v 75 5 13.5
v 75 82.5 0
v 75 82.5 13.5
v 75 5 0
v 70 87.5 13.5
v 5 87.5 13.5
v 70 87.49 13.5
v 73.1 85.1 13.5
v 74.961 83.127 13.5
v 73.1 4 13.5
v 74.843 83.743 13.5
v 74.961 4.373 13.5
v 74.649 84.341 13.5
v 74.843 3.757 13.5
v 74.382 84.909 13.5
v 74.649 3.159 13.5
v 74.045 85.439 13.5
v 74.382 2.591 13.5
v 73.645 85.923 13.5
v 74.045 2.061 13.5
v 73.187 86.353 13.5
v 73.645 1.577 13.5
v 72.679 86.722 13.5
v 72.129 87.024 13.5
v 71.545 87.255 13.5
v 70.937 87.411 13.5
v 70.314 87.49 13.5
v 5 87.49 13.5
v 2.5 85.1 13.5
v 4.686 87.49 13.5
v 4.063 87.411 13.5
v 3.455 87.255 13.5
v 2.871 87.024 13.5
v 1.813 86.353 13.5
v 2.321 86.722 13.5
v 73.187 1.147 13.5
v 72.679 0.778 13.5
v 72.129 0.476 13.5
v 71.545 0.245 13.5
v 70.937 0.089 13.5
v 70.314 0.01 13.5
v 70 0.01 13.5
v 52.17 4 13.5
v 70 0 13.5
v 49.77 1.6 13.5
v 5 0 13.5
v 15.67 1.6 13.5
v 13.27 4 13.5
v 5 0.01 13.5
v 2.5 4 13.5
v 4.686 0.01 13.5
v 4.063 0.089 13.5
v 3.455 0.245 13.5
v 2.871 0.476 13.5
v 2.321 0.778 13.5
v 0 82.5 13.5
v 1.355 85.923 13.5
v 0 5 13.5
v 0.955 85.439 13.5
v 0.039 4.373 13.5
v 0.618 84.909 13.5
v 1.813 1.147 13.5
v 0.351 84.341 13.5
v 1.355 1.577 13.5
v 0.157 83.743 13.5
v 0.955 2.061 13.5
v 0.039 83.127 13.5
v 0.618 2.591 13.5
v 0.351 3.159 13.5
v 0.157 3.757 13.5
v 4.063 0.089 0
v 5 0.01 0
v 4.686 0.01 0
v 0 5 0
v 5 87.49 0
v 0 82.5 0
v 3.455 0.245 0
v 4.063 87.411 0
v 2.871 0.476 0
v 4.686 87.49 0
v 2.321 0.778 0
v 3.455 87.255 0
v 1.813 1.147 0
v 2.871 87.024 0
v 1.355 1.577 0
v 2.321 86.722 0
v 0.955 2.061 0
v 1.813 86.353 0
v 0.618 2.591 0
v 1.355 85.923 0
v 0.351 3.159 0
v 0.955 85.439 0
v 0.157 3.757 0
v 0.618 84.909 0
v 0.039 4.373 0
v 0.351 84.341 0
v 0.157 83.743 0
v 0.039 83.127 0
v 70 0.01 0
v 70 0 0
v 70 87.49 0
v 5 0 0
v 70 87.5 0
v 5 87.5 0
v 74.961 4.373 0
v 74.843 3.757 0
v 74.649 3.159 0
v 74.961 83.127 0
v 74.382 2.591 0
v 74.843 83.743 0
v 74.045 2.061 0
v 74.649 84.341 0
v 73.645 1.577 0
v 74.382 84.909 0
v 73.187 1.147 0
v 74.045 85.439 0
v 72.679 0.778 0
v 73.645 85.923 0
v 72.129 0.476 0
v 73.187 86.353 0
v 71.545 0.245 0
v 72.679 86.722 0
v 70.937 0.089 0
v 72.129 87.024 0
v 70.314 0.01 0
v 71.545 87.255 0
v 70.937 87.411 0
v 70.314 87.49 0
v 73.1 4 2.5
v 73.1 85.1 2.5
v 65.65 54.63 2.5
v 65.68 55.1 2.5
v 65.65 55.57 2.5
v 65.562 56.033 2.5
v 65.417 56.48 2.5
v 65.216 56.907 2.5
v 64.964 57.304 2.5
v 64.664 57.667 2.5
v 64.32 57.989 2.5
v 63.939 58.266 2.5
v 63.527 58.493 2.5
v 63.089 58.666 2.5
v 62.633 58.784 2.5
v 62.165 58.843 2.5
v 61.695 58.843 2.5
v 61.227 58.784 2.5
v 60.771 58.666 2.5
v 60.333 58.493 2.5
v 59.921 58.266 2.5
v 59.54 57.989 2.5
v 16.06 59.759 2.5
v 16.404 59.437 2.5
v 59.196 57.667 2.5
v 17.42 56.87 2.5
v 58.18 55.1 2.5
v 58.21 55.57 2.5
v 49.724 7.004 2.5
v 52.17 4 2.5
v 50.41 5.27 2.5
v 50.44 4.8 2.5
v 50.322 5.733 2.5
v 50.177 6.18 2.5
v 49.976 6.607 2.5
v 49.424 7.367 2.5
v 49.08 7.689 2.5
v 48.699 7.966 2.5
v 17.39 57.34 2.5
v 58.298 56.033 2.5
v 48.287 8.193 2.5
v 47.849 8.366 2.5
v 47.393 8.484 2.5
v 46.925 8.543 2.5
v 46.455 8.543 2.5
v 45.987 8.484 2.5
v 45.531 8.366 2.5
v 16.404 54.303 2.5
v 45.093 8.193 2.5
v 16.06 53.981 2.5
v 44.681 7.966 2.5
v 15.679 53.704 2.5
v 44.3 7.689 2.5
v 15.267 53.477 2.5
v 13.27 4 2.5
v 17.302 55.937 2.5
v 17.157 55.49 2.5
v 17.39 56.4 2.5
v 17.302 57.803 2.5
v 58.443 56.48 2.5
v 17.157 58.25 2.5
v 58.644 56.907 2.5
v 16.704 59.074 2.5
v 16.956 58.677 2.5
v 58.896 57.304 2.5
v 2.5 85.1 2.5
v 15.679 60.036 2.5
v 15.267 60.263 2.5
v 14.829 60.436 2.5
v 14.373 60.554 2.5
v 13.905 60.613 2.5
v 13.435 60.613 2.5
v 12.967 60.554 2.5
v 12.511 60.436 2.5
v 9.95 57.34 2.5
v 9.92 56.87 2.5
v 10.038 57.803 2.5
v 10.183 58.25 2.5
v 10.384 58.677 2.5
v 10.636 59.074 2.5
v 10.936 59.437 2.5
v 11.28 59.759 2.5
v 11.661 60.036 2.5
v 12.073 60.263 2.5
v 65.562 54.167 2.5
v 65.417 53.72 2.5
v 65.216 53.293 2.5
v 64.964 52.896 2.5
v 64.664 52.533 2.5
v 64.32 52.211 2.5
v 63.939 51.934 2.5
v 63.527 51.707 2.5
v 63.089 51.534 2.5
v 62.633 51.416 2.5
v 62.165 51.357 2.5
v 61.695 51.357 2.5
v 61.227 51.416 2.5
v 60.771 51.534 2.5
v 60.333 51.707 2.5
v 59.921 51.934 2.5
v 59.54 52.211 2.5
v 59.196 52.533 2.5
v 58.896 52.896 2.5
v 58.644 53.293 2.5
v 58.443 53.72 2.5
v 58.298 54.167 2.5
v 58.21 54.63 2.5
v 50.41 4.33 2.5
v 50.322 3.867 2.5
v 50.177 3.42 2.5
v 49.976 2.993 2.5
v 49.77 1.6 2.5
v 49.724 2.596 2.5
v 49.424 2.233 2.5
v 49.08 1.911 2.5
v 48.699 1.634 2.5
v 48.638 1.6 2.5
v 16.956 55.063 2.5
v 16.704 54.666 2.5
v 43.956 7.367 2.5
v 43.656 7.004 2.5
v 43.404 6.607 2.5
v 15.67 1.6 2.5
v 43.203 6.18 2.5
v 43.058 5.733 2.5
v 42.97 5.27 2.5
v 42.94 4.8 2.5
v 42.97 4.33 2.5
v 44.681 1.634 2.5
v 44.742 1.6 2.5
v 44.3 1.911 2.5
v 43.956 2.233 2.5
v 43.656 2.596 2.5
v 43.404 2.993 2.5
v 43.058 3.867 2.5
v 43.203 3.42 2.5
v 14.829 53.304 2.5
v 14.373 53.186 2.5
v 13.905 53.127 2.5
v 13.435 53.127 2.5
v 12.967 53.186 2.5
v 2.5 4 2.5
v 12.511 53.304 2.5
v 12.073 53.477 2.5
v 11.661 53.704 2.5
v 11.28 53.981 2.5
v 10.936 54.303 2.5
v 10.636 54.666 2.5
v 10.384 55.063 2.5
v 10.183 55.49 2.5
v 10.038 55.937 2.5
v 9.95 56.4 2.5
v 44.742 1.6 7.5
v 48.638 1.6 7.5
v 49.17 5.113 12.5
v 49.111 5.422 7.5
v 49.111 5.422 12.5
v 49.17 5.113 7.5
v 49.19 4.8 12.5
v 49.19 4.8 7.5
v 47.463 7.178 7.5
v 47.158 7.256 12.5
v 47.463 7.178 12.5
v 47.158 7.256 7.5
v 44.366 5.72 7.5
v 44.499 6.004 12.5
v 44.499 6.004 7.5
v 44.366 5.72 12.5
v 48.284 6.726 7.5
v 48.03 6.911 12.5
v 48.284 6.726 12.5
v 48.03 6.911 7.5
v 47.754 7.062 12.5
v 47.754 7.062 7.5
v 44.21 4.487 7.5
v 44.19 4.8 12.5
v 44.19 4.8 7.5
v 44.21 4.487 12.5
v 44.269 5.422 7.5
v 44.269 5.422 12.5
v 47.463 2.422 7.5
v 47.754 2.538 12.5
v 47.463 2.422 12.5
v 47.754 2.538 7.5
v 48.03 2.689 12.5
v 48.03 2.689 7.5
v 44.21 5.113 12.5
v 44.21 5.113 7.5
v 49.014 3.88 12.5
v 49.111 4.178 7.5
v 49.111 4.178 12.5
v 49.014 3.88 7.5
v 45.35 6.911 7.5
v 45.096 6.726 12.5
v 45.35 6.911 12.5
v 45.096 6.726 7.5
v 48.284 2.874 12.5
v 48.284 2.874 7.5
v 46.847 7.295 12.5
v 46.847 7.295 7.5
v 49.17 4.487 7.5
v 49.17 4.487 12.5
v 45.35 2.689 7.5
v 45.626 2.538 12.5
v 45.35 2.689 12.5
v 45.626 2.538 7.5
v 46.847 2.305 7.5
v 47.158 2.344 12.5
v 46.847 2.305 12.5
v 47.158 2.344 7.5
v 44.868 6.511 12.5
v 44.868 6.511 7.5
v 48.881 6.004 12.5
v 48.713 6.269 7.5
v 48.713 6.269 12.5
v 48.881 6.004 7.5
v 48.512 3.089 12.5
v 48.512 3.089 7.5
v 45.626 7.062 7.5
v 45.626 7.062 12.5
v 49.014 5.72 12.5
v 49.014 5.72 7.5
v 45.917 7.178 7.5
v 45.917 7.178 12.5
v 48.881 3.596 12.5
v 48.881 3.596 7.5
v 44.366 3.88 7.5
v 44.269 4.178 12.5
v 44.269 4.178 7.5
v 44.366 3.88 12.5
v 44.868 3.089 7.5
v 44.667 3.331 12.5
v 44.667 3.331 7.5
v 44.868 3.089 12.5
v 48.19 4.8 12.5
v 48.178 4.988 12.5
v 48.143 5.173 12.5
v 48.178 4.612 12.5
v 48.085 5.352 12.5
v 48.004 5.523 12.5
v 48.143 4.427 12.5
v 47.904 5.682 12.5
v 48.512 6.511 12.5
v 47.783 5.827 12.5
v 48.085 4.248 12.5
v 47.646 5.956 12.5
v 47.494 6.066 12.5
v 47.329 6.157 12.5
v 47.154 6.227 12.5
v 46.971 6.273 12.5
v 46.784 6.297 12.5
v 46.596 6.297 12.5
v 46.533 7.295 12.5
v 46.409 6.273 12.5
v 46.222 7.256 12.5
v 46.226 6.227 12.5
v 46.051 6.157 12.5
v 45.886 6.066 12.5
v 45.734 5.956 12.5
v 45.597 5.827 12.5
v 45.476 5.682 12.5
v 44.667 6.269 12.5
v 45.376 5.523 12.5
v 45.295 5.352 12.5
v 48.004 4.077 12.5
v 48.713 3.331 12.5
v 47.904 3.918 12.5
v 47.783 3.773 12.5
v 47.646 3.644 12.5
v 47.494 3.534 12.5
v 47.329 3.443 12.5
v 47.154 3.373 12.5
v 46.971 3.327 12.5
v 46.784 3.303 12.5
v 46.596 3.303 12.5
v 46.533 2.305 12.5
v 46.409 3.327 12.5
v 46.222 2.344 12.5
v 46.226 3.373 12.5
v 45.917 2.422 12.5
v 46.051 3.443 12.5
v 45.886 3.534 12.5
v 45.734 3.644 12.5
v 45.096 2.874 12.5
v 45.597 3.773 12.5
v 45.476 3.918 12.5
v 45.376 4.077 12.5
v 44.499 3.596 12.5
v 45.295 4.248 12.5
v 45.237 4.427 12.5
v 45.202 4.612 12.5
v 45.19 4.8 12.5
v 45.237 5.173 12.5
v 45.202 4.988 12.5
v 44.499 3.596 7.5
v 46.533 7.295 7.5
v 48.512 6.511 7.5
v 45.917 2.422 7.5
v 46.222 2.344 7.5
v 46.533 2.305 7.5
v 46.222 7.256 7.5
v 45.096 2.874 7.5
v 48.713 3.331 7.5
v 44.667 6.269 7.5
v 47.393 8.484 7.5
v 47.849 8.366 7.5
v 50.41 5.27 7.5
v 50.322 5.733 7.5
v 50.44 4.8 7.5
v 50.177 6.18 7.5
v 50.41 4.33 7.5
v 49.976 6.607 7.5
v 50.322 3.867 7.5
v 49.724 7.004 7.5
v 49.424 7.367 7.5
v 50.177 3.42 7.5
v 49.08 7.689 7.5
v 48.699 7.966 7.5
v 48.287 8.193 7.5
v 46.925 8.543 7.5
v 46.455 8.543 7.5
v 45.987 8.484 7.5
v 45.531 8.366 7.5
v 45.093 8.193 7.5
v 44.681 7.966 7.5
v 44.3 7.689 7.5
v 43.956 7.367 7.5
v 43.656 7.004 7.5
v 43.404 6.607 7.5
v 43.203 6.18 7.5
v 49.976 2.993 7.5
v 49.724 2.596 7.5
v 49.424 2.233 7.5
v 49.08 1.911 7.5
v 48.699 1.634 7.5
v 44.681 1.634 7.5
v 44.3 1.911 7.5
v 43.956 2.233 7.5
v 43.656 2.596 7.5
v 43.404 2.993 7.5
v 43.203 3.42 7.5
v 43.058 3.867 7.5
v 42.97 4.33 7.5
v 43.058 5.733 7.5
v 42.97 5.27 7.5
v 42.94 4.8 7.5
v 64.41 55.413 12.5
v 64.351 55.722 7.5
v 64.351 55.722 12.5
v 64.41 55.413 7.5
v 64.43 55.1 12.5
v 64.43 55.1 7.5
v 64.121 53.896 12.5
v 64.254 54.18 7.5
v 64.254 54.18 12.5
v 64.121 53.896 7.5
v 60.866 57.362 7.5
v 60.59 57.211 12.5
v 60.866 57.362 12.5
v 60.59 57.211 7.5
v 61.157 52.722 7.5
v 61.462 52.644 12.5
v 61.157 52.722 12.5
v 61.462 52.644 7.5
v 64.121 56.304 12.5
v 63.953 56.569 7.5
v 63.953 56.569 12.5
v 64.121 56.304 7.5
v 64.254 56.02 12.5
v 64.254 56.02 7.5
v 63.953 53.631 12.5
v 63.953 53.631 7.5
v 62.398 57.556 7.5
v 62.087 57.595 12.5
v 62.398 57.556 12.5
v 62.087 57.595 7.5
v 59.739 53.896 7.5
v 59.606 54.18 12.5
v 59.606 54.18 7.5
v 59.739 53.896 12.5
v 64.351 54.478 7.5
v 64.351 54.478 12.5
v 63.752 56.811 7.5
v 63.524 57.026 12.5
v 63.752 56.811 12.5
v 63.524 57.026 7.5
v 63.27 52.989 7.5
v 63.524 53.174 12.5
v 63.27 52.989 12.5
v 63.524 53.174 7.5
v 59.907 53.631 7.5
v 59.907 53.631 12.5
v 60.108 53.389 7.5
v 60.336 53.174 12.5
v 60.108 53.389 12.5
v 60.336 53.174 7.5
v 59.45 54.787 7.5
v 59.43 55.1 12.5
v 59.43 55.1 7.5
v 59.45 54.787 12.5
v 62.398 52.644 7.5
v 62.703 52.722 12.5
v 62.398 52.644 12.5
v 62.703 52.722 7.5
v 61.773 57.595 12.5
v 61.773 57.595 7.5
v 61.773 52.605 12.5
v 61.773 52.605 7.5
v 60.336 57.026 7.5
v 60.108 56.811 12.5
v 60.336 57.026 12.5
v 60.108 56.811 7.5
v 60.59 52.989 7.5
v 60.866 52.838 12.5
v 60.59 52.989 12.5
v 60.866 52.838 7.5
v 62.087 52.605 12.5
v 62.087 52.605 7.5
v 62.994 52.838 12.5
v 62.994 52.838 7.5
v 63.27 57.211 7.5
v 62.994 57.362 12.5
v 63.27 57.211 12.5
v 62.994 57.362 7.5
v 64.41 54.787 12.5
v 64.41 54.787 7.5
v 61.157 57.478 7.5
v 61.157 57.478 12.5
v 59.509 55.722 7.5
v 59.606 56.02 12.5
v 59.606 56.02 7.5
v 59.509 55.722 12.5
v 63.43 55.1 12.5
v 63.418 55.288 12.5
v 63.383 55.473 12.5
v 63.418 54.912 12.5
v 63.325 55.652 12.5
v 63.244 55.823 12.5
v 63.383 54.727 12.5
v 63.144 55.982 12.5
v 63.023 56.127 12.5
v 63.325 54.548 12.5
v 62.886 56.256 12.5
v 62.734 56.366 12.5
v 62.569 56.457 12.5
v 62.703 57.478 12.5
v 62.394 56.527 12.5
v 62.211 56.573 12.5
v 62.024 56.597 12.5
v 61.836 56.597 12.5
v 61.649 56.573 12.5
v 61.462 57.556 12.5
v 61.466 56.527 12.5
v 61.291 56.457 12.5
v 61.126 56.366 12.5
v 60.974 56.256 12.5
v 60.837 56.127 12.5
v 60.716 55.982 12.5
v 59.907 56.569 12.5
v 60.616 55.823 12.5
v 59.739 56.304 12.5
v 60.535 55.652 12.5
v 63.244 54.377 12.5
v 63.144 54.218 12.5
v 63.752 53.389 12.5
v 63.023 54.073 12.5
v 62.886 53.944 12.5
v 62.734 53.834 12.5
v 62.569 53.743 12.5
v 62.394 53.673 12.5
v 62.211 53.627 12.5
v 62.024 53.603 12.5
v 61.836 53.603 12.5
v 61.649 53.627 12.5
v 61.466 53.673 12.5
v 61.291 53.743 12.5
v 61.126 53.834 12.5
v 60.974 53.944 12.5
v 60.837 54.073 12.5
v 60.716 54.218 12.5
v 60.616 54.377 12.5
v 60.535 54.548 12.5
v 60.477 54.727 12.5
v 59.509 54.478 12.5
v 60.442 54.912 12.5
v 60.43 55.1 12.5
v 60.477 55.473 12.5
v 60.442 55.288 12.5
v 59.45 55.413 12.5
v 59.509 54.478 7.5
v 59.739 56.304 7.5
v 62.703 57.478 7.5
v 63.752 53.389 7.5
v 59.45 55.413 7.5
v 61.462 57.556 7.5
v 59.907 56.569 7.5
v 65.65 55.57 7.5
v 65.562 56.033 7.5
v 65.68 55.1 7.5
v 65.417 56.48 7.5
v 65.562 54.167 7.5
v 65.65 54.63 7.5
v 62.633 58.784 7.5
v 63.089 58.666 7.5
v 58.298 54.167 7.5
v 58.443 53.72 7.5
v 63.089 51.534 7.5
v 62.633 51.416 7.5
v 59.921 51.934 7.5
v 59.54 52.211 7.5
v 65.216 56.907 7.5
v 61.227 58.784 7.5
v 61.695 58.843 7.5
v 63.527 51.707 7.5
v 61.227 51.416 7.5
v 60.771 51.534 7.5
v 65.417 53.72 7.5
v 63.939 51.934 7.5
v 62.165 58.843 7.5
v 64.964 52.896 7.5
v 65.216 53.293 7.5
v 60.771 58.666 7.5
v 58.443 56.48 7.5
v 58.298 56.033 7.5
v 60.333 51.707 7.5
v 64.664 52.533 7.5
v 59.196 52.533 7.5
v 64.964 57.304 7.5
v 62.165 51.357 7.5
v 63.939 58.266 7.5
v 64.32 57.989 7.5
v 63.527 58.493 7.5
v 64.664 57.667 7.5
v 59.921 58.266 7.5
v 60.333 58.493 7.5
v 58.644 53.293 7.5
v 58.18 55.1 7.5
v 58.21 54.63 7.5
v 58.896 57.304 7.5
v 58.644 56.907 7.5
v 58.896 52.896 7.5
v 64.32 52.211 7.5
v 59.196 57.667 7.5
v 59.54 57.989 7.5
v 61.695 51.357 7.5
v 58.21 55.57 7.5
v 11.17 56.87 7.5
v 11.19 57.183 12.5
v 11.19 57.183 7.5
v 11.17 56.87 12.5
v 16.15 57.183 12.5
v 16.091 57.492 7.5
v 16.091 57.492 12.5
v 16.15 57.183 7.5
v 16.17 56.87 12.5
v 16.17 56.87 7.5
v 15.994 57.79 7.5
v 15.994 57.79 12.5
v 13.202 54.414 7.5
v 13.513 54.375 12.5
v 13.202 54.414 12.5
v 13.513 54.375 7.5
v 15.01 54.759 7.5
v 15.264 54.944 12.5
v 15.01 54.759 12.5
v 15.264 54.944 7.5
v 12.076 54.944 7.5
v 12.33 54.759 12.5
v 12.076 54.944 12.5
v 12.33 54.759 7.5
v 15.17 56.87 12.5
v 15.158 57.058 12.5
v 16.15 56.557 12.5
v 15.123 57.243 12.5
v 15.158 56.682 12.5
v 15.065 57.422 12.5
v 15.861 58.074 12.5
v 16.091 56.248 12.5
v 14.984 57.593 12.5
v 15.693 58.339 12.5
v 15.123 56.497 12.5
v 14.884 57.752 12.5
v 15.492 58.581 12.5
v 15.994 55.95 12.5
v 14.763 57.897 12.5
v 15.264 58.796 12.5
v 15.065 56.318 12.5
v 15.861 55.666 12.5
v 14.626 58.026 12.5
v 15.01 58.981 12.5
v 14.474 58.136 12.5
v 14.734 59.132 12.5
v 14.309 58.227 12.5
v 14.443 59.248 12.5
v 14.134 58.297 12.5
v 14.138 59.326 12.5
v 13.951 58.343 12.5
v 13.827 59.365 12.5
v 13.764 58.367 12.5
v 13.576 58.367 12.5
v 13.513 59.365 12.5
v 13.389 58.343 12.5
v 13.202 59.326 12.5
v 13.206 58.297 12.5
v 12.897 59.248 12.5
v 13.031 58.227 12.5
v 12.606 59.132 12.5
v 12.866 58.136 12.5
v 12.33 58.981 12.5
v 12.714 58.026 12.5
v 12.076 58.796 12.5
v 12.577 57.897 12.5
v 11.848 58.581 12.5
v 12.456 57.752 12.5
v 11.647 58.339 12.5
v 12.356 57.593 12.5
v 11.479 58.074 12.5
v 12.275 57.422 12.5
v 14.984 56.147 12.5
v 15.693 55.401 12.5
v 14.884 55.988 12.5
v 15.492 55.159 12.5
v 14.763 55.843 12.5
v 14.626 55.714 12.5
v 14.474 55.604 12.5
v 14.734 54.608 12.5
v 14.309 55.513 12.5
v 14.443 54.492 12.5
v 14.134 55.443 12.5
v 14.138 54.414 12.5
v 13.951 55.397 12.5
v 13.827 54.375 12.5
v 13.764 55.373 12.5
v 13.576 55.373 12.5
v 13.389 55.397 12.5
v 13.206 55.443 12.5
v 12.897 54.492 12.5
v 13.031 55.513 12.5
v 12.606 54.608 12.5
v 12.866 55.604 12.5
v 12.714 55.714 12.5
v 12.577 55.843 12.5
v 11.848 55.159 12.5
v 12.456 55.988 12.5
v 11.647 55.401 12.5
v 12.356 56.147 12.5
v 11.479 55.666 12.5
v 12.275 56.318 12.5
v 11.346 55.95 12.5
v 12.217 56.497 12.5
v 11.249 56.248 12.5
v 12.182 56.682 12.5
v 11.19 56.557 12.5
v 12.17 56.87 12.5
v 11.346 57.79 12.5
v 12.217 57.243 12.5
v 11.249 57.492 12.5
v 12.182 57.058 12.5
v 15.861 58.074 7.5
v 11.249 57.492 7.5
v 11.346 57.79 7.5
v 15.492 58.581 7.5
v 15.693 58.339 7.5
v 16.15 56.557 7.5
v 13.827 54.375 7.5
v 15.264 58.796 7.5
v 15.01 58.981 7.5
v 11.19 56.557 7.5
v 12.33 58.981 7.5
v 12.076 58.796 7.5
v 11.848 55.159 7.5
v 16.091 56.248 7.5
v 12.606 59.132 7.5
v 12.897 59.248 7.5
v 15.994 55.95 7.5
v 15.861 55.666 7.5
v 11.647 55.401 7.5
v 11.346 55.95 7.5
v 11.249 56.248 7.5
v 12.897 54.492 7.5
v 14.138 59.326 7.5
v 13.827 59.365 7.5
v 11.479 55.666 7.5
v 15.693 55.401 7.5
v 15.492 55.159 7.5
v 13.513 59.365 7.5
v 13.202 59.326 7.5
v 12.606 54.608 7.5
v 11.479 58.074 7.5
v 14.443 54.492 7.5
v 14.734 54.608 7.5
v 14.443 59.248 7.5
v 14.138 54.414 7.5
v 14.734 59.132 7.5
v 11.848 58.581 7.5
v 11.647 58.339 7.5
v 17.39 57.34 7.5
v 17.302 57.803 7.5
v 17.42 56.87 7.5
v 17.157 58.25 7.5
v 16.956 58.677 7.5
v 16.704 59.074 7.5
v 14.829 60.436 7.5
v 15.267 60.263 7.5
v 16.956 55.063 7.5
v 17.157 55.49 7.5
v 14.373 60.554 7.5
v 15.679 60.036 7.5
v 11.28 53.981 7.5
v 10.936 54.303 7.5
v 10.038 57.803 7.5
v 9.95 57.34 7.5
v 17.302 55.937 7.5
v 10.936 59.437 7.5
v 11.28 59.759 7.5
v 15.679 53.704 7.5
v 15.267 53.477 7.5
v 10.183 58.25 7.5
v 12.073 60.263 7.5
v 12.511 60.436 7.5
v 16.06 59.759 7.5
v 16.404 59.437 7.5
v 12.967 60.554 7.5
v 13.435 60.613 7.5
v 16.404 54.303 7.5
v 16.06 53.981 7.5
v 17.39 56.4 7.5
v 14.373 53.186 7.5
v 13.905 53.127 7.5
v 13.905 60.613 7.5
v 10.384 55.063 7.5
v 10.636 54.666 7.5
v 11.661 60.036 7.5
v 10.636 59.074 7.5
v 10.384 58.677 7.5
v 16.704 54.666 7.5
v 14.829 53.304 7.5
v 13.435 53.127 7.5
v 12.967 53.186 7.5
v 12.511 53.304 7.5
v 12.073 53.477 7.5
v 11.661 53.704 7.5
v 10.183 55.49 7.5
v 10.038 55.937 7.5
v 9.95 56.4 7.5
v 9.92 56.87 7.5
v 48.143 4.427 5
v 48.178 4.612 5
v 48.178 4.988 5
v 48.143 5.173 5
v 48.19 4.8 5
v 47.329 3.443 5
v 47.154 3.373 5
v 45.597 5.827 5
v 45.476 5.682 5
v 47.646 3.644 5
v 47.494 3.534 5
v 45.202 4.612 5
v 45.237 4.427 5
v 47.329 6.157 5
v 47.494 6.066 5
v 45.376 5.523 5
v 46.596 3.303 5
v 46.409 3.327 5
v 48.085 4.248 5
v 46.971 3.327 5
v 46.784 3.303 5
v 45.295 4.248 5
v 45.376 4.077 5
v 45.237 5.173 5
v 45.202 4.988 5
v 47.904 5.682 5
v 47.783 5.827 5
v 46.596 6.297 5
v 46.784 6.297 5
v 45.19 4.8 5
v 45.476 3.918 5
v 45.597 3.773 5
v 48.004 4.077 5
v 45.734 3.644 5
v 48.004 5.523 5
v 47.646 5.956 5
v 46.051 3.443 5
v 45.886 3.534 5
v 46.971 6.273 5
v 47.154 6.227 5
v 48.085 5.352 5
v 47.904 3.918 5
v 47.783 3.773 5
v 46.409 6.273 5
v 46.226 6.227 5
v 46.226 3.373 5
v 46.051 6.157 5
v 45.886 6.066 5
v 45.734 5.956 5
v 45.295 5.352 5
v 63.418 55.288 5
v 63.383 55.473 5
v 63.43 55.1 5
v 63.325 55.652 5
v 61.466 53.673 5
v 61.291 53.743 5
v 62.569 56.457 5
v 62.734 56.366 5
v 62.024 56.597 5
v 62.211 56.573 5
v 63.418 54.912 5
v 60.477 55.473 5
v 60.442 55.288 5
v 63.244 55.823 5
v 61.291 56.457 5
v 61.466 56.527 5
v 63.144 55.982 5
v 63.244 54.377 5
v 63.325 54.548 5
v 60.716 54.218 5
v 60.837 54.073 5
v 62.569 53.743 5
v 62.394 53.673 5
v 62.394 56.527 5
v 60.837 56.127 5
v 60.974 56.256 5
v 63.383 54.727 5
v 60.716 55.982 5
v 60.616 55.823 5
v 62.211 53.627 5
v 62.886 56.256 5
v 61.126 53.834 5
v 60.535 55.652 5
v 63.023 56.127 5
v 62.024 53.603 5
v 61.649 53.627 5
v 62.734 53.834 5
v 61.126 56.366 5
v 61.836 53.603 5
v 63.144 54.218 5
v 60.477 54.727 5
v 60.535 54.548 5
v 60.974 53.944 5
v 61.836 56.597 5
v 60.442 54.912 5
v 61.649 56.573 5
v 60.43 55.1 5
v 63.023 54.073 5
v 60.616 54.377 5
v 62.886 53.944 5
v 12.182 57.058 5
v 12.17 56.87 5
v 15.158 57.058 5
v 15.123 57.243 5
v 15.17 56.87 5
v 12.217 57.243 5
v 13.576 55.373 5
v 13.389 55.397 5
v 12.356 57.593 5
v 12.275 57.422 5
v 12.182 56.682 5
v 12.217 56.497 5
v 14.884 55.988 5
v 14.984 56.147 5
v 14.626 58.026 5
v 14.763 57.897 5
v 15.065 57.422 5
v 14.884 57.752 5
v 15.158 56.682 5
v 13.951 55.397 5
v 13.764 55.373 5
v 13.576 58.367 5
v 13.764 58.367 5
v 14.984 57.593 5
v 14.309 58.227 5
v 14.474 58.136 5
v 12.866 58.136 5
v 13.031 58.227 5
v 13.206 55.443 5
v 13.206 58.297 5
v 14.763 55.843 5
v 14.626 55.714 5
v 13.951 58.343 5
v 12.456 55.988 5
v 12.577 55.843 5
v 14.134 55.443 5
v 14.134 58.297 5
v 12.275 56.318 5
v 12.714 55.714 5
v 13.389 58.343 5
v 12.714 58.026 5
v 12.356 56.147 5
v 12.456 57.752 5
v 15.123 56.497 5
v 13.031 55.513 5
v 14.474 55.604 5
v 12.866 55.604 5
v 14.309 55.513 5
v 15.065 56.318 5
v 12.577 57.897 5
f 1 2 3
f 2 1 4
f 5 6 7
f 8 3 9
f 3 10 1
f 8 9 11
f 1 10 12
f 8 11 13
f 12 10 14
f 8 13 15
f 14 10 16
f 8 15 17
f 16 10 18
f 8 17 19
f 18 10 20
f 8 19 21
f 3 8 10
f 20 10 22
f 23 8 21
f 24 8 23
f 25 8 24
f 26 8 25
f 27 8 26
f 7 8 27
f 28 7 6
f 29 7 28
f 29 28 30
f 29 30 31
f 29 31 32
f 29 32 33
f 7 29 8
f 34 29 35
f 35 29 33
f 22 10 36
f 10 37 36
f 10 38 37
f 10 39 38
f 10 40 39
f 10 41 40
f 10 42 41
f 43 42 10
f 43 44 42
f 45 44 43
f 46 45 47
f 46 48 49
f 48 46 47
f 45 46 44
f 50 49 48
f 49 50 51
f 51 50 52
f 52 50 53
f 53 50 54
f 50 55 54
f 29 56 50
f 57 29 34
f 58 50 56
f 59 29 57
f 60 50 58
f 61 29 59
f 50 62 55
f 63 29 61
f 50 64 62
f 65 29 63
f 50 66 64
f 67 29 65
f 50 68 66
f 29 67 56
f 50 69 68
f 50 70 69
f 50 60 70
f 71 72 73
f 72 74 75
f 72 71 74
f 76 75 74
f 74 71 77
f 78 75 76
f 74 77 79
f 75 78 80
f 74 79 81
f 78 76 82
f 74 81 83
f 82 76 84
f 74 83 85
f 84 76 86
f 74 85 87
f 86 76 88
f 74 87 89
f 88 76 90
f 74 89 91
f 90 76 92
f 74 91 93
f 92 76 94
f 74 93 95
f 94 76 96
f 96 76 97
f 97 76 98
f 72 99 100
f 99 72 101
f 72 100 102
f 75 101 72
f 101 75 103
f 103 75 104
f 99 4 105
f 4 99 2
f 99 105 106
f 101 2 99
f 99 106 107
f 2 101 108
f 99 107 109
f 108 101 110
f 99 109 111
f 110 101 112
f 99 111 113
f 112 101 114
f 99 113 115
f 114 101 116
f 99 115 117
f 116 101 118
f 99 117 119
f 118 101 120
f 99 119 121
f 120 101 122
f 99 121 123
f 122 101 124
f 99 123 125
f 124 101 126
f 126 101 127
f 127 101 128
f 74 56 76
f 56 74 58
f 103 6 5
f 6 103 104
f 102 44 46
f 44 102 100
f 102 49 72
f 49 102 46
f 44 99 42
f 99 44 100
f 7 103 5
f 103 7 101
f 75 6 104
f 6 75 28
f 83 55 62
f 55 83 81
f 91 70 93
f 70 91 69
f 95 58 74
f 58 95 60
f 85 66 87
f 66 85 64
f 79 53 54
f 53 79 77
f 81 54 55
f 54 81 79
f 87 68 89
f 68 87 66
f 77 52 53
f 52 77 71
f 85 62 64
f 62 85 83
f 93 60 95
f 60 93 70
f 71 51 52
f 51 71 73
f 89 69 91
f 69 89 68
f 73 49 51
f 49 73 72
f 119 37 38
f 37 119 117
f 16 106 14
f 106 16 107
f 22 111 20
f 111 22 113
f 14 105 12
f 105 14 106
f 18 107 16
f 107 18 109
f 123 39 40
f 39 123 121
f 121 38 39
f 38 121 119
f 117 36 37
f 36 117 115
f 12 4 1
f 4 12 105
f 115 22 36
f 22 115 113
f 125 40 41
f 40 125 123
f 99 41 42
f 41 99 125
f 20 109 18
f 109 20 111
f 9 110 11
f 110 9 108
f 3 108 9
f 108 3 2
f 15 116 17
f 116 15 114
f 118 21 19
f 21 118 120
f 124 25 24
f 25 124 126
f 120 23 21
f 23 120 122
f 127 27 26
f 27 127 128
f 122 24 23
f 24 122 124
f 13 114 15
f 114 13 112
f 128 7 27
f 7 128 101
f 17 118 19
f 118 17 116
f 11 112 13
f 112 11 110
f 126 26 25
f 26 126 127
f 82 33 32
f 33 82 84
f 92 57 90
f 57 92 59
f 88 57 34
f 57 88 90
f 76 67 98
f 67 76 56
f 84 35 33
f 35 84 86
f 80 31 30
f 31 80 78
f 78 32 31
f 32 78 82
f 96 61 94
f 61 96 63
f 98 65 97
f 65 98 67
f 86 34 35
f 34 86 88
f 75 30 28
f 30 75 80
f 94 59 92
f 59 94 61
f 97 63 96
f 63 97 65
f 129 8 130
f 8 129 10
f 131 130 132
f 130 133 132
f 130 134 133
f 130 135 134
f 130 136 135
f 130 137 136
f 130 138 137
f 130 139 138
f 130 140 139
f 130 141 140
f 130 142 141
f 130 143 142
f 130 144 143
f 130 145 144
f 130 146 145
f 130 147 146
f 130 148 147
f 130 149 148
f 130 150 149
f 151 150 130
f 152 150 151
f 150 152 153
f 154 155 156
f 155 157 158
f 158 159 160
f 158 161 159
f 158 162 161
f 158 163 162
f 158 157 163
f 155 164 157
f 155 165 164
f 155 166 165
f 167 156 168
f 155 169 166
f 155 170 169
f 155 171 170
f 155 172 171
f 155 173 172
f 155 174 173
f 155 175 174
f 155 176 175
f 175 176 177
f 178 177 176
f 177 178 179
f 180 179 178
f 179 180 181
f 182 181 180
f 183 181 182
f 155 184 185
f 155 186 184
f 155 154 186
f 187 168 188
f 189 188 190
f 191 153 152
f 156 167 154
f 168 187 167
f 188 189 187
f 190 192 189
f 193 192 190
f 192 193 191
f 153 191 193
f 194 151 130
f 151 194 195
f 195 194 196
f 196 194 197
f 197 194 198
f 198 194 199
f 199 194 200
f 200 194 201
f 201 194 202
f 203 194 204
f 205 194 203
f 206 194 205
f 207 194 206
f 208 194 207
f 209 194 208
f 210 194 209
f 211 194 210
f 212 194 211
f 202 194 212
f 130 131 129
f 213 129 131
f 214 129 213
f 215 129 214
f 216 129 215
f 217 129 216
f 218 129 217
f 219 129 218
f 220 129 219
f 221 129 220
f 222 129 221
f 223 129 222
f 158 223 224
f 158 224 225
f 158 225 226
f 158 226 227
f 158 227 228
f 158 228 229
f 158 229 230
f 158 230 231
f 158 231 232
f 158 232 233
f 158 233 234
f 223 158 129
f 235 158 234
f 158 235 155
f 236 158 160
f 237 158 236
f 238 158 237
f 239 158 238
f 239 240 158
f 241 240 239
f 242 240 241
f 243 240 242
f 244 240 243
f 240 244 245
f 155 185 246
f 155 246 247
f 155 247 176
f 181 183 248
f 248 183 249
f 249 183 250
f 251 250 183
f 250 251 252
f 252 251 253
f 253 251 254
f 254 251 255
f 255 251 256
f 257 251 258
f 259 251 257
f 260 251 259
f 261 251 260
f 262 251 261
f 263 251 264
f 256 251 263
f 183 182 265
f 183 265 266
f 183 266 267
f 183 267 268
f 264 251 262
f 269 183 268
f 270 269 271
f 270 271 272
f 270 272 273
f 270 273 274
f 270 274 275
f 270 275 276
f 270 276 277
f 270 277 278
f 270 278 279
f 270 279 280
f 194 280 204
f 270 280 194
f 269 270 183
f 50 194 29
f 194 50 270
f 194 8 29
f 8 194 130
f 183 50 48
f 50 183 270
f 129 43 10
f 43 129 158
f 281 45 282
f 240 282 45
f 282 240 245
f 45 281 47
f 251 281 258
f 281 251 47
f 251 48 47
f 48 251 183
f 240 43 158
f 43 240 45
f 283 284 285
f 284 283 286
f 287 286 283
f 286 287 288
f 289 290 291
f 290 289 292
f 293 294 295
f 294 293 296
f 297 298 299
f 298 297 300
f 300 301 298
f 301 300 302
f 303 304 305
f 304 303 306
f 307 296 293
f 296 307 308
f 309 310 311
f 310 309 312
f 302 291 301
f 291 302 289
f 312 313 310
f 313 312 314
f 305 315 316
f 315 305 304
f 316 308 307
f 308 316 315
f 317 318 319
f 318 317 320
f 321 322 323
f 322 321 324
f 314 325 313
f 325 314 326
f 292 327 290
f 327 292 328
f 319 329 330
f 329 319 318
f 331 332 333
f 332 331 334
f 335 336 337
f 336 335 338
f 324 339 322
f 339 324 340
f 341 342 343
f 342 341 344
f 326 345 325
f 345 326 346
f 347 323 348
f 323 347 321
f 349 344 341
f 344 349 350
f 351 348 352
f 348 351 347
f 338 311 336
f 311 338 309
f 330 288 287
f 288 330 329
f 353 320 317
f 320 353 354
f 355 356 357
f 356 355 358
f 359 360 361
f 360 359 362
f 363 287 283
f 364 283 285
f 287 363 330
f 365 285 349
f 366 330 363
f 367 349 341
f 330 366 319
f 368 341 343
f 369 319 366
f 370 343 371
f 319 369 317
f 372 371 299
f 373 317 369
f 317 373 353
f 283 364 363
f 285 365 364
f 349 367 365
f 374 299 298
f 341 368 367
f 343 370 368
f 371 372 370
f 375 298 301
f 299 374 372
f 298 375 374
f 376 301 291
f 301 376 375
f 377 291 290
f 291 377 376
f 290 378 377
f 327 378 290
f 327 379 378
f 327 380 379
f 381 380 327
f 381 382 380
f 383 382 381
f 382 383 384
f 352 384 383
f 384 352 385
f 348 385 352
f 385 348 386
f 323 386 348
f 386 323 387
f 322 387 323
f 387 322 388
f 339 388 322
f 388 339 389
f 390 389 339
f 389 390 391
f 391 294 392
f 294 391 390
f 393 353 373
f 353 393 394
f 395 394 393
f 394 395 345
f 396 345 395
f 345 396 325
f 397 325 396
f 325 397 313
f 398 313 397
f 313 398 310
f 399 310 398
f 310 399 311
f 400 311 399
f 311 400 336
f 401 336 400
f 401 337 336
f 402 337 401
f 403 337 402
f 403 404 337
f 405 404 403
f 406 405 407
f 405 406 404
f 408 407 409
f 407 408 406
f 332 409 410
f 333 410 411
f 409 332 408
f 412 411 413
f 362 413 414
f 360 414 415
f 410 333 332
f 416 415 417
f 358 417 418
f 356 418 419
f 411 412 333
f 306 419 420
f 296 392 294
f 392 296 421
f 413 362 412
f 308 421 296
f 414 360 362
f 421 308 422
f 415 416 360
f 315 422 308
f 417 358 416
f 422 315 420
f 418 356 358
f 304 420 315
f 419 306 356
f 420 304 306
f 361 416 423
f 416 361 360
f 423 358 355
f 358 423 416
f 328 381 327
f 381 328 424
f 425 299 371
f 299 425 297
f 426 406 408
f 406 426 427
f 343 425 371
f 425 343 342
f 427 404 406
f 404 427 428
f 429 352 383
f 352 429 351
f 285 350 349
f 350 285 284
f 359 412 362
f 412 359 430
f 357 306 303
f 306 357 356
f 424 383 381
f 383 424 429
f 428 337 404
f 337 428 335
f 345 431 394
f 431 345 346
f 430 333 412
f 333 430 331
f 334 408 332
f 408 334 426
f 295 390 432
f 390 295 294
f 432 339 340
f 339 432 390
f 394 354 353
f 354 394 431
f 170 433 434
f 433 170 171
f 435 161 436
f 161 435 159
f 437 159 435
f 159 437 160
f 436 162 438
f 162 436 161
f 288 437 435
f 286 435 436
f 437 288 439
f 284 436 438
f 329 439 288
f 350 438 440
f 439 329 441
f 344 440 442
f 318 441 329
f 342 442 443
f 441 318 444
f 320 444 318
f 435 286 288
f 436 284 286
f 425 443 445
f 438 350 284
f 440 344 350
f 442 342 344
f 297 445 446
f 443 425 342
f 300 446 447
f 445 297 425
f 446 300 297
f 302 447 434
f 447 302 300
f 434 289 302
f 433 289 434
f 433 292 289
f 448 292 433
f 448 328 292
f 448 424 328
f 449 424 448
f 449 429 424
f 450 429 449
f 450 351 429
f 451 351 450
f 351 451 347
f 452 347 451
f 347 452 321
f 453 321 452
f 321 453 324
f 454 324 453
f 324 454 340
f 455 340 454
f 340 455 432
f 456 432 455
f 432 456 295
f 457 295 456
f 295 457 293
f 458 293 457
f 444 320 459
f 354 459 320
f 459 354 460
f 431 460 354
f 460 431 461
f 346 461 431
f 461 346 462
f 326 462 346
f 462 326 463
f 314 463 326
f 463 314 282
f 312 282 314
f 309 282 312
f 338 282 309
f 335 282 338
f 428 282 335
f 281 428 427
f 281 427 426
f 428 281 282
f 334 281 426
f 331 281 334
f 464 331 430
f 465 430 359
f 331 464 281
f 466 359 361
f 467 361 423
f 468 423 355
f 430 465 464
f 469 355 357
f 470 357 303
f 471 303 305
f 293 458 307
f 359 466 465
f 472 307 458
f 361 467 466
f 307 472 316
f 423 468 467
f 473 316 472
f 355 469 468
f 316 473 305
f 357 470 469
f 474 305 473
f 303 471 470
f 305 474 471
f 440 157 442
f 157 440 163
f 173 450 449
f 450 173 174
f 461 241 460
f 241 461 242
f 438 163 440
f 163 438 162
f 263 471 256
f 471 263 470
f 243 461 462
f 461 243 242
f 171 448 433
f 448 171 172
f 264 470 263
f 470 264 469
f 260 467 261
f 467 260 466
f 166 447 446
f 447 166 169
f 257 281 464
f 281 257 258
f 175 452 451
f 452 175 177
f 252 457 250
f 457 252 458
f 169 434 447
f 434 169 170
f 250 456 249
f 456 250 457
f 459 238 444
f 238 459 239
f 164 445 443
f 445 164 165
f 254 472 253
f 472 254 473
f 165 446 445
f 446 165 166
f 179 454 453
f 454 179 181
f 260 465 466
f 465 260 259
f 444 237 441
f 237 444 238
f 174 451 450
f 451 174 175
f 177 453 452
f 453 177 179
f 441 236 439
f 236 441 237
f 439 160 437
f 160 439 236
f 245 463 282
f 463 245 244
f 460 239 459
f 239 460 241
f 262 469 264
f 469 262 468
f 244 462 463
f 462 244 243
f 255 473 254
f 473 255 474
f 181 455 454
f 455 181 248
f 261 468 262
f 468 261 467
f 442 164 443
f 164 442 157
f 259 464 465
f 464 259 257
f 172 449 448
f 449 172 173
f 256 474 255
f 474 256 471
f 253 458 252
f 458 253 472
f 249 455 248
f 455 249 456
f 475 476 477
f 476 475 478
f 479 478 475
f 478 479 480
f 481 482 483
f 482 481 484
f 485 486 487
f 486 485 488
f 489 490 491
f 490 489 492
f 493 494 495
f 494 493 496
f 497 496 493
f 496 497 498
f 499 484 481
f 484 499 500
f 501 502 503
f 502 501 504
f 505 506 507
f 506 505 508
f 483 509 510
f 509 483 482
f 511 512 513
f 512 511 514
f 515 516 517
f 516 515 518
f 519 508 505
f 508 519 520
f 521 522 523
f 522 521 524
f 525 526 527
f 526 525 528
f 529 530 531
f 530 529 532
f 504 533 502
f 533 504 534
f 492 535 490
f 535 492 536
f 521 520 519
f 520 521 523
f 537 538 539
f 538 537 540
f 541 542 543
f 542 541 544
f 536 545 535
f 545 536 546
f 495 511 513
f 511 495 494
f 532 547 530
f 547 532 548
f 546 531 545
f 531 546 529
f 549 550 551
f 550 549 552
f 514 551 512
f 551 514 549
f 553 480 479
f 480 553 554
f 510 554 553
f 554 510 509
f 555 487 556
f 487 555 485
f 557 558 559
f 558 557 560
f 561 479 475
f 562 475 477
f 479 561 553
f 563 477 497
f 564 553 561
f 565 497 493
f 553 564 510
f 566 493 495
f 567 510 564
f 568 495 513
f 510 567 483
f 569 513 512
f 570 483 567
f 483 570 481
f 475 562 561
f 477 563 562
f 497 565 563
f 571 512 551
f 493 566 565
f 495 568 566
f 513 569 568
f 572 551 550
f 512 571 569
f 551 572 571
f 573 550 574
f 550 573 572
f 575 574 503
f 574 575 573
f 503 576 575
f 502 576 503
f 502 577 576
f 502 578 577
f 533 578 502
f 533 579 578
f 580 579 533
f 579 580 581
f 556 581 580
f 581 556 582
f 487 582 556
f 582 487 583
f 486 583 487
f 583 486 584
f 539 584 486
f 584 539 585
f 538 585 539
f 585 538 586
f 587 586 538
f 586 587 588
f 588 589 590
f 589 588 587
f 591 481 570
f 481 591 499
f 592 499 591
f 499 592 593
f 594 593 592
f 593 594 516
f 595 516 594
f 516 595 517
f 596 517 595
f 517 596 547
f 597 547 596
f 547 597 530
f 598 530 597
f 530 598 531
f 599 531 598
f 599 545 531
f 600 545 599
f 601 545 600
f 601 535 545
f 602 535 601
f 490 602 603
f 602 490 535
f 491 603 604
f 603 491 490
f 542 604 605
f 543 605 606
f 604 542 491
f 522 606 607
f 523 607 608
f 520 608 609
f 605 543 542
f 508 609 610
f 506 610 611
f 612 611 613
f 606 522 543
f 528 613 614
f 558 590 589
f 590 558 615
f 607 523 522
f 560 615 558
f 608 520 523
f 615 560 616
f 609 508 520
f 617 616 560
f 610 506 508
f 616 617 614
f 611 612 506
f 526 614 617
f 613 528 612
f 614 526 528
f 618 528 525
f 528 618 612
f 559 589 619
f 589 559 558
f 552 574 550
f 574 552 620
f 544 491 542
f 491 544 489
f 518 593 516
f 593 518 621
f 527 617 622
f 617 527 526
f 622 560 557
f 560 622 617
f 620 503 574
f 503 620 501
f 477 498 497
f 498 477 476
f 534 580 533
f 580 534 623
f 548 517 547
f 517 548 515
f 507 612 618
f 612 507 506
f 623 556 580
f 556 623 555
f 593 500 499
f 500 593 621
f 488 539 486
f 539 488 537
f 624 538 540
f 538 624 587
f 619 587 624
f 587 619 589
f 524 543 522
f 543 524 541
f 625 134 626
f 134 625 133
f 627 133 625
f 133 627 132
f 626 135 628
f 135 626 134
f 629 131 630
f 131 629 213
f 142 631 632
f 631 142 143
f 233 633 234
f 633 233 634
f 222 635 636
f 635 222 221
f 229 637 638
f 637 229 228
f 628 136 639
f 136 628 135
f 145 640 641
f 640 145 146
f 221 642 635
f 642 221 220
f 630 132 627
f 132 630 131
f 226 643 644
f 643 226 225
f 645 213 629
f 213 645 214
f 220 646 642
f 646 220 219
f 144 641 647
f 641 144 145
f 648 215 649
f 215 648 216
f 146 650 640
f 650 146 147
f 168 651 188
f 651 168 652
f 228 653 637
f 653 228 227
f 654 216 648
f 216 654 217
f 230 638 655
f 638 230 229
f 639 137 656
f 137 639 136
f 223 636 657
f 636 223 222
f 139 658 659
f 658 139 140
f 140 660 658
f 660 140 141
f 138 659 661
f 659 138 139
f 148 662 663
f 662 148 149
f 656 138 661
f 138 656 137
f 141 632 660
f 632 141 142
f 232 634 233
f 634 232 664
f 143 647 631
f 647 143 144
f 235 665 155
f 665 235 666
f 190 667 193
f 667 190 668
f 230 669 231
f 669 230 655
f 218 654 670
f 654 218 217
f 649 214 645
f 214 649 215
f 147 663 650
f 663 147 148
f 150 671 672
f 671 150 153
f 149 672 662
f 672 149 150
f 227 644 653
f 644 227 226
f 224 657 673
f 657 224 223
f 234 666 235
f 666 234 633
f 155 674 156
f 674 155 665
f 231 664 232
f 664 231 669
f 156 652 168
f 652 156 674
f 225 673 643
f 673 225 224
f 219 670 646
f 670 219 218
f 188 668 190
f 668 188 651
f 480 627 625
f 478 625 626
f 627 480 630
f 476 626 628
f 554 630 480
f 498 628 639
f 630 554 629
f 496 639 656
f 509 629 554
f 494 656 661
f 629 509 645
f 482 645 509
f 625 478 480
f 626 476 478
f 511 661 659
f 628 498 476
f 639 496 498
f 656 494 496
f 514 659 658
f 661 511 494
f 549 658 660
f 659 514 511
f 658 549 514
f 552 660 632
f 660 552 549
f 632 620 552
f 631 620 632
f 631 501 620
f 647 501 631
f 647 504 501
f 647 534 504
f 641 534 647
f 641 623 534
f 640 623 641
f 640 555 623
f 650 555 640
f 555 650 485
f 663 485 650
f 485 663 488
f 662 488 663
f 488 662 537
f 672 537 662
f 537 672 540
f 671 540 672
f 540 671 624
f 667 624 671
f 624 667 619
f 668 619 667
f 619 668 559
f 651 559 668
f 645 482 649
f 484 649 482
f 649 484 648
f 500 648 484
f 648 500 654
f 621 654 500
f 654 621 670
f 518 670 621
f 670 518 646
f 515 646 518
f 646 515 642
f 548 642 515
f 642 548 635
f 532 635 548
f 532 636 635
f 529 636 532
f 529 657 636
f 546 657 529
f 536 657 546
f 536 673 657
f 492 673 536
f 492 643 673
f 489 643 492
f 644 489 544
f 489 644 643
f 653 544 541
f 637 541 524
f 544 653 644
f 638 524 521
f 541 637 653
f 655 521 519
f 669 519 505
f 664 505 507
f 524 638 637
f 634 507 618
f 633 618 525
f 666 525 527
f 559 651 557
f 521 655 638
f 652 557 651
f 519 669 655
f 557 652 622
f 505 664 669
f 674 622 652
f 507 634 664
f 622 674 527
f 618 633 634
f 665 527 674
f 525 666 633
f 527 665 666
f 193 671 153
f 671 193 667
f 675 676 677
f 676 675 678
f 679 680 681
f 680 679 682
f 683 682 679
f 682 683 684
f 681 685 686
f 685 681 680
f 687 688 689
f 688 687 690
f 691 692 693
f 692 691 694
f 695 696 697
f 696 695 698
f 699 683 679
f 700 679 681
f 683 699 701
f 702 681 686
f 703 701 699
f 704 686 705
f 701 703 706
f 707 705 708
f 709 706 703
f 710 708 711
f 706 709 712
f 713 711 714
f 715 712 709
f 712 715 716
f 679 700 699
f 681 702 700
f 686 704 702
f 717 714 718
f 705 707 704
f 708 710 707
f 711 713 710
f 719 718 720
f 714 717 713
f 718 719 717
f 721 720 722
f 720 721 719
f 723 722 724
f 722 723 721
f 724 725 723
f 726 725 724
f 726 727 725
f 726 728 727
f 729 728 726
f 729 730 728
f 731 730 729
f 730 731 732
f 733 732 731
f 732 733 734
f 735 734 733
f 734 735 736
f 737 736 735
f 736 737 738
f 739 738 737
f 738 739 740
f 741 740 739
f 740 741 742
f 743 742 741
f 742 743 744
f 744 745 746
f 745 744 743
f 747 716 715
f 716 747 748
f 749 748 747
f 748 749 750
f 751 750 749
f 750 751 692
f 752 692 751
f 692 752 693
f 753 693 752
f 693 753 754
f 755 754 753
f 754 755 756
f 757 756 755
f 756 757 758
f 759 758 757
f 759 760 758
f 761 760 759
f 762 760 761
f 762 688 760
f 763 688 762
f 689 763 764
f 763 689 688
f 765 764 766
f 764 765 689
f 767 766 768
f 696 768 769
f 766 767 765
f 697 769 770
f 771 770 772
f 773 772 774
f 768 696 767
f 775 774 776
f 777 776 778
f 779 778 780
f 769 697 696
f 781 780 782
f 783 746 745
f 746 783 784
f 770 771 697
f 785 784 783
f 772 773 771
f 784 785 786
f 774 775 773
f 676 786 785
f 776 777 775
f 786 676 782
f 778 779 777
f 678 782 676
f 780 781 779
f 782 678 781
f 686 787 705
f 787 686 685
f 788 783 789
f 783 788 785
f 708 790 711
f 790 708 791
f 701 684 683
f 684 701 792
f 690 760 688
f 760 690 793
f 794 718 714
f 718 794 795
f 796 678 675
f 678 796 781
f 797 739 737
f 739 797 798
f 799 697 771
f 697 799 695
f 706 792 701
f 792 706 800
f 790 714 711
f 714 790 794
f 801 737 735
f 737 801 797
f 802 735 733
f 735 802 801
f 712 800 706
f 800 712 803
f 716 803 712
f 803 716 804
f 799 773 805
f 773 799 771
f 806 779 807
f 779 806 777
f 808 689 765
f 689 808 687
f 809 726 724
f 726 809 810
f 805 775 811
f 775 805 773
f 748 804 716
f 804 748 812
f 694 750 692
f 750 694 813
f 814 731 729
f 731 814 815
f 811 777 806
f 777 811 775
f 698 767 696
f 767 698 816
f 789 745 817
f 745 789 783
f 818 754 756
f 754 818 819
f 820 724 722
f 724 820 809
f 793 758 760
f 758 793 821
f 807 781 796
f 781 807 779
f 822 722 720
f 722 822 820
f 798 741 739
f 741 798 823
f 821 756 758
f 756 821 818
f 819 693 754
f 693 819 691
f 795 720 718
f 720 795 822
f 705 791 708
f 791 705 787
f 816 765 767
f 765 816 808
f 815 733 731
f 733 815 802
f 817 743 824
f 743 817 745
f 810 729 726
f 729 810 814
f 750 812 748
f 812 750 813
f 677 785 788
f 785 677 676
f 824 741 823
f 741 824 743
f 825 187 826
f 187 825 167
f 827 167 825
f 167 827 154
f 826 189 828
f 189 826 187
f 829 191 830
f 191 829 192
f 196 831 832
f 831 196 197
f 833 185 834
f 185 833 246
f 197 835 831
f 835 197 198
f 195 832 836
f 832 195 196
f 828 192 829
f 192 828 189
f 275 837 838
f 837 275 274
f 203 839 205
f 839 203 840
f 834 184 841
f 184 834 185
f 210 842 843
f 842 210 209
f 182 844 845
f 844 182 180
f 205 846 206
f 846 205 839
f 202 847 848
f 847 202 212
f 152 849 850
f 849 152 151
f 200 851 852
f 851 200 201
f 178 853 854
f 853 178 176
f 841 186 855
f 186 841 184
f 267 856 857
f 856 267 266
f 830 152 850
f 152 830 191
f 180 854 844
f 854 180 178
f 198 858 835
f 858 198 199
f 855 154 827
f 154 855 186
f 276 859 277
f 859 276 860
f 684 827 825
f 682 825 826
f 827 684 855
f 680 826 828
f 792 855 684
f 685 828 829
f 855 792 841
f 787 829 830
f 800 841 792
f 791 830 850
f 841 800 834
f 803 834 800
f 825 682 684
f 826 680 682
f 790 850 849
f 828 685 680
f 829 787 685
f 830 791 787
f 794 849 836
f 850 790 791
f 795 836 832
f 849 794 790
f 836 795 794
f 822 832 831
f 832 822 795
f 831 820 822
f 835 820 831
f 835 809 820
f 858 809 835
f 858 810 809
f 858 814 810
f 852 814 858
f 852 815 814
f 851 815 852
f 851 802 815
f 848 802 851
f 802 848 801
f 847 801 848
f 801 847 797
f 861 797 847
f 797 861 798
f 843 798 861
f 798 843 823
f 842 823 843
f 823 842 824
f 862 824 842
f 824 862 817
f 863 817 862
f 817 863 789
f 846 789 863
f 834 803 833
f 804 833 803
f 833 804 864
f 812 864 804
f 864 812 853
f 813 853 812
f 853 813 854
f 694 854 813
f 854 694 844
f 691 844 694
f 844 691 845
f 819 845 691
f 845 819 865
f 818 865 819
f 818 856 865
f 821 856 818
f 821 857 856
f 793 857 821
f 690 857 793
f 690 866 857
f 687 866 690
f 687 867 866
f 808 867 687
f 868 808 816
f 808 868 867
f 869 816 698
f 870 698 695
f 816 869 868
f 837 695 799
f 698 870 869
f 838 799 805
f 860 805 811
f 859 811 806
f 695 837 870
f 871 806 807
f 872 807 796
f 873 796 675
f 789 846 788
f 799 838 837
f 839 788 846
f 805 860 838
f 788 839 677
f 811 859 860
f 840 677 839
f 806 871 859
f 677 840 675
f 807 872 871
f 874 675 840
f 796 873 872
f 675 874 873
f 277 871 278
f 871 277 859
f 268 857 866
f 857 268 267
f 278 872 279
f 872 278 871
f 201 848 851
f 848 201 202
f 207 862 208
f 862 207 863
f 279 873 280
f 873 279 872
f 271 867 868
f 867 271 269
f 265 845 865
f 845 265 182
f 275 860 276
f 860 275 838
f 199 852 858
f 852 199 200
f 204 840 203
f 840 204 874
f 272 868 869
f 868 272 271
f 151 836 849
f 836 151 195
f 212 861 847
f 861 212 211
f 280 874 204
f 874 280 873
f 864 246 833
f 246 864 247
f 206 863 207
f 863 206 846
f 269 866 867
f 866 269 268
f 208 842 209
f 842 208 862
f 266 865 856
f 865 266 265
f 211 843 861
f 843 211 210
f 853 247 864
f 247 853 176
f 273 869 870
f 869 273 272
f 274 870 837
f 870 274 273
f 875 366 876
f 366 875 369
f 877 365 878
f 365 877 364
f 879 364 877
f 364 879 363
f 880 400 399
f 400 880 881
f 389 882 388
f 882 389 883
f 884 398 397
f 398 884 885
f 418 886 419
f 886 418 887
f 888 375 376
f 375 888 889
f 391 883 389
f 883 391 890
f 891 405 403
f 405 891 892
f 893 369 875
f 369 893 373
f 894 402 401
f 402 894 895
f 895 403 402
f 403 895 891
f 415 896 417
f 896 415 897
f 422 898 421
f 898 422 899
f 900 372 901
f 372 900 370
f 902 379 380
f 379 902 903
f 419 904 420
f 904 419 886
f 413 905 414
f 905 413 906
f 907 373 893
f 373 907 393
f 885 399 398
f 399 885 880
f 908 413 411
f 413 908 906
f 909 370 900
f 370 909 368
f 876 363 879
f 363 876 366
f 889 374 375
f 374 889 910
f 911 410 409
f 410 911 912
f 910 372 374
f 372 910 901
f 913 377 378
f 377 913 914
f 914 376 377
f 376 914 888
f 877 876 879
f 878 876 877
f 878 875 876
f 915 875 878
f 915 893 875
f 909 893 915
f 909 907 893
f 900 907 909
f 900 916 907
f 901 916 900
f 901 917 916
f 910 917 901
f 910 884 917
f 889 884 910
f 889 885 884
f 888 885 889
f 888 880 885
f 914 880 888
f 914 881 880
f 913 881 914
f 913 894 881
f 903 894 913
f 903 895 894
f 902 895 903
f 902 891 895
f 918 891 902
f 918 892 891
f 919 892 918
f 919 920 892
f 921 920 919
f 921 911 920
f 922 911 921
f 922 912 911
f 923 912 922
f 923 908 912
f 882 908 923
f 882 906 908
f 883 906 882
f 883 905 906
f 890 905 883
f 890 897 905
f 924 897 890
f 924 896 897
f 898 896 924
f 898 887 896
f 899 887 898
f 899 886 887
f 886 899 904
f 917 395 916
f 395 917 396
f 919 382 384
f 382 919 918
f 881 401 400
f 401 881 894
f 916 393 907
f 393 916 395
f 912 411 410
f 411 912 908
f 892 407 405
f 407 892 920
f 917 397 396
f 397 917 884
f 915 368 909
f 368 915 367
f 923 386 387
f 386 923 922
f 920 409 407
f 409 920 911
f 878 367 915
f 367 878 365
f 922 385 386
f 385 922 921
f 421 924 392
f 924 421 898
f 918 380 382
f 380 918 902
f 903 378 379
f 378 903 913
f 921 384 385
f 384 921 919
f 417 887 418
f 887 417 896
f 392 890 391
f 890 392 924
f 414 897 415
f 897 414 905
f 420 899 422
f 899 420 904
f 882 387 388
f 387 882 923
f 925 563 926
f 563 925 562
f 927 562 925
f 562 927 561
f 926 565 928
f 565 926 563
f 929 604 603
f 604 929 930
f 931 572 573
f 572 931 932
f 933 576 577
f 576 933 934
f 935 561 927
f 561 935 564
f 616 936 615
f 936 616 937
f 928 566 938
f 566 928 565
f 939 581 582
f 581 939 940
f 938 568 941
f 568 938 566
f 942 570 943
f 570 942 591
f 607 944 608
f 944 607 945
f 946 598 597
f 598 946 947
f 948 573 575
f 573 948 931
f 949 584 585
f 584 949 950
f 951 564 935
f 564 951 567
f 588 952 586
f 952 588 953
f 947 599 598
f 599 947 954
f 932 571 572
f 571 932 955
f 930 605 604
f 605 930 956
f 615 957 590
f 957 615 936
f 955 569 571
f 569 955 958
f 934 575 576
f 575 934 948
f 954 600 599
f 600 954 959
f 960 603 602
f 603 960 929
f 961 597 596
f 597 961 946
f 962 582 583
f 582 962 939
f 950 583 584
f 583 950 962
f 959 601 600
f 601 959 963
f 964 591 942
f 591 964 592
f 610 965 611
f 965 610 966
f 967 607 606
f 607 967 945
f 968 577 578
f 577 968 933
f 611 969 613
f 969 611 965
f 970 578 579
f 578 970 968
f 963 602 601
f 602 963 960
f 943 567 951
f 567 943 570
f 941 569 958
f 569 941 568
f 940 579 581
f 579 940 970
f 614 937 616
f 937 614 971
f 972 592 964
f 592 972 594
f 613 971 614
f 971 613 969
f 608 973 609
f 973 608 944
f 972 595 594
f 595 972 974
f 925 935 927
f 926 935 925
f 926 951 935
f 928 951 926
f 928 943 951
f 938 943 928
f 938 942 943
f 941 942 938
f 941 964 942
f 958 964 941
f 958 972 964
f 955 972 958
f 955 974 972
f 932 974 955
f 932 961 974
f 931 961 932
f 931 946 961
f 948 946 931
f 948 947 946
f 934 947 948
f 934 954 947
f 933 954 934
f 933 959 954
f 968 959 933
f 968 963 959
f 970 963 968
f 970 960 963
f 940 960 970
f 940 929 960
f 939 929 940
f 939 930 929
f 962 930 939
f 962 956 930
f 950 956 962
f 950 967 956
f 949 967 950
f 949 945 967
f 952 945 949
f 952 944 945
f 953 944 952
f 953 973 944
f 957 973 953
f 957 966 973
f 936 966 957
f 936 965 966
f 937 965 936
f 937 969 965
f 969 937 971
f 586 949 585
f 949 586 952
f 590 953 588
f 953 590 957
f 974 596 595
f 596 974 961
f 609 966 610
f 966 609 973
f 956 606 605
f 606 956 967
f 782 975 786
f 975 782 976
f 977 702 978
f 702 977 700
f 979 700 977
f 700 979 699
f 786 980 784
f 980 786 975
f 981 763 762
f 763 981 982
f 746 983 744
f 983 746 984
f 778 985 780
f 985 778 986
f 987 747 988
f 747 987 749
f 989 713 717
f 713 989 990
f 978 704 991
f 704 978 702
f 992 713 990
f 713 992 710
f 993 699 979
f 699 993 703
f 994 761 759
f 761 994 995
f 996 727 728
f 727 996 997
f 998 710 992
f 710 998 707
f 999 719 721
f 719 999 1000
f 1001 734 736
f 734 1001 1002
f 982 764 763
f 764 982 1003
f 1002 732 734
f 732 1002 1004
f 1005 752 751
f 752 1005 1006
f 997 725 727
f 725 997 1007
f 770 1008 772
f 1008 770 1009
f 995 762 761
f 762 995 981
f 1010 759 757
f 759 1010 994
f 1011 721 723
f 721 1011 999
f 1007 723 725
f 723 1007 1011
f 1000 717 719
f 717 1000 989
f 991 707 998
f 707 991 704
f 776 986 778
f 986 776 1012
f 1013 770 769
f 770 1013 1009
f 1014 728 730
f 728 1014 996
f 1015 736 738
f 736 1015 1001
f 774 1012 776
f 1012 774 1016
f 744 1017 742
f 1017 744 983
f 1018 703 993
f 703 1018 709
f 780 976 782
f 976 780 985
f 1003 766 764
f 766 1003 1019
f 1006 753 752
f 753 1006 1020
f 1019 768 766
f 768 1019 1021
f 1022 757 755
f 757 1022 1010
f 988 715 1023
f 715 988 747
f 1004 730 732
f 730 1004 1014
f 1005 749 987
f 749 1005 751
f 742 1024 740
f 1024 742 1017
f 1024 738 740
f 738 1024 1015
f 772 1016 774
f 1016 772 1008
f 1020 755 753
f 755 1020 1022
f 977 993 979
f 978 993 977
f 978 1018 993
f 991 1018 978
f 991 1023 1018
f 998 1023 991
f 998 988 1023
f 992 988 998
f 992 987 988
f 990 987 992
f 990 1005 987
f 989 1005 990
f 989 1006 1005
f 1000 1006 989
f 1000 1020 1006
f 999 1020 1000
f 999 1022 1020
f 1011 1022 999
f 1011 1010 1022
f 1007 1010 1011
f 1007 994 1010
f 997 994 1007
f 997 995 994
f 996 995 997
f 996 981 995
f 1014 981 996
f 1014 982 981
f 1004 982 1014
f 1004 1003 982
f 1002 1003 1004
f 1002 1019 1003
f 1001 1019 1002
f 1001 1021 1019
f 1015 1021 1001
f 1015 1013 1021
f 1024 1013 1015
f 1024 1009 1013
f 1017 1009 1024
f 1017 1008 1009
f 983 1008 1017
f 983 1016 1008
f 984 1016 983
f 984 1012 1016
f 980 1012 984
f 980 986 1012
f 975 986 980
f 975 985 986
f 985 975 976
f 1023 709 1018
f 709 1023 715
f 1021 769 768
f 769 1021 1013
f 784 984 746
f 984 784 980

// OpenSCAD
//  Christian Daigneault-St-Arnaud
$fn = 50;
/*  Nucleo Dimensions   */
nucleo_width = 70;
nucleo_length = 82.5;
nucleo_bump_width = 33.5;
nucleo_bump_angle_width = 2;
nucleo_bump_length = 2;
nucleo_height = 10;

/* Screws position  */
screw_id = 3;
screw_od = screw_id + 2;
screw_bottom_x = 43.89;
screw_bottom_y = 0.5;
screw_top_right_x = 59.13;
screw_top_right_y = 50.8;
screw_top_left_x = 10.87;
screw_top_left_y = 52.57;

/*  Case dimension  */
wall_width = 2.5;
case_width = nucleo_width + 2*wall_width;
case_length = nucleo_length + 2*wall_width;
case_height = nucleo_height + wall_width+1;

/*  Case opening dimension  */
extra_width = 0.6;
extra_length = 0.6;
opening_width = nucleo_width + extra_width;
opening_length = nucleo_length + extra_length;
opening_bump_width = nucleo_bump_width + extra_width;
opening_bump_angle_width = nucleo_bump_angle_width+0.0;
opening_bump_length = nucleo_bump_length+0.4;
opening_height = case_height-wall_width;


/*      Model       */

module opening(){
    cube([opening_width,opening_length-nucleo_bump_length,opening_height]);
    translate([10.87+extra_width/2+opening_bump_angle_width,-opening_bump_length,0]) cube([opening_bump_width,opening_bump_length,opening_height]);
    translate([10.87+extra_width/2+opening_bump_angle_width,-opening_bump_length,0]) rotate([0,0,45]) cube([opening_bump_angle_width,opening_bump_length*2,opening_height]);
    translate([10.87+extra_width/2+opening_bump_width+opening_bump_angle_width,-opening_bump_length,0]) rotate([0,0,45]) cube([opening_bump_angle_width*2,opening_bump_length,opening_height]);
}

module enclosure(){
    $fn = 50;

    r = 5;
   difference(){
        cube([case_width,case_length,case_height]);
        cube([r,r,case_height]);
        translate([case_width-r,0,0]) cube([r,r,case_height]);
        translate([case_width-r,case_length-r,0]) cube([r,r,case_height]);
        translate([0,case_length-r,0]) cube([r,r,case_height]);
    }
    translate([r,r,0]) cylinder(r=r,h=case_height);
    translate([case_width-r,r,0]) cylinder(r=r,h=case_height);
    translate([case_width-r,case_length-r,0]) cylinder(r=r,h=case_height);
    translate([r,case_length-r,0]) cylinder(r=r,h=case_height);
}

module screw(){
    difference(){
        union(){
            //hull(){
                translate([screw_bottom_x+extra_width/2,screw_bottom_y+extra_length/2,0]) cylinder(d = screw_od, h =nucleo_height);
                translate([screw_bottom_x+extra_width/2,screw_bottom_y+extra_length/2,0]) cylinder(d = screw_od*1.5, h =nucleo_height/2);
            //}
            //hull(){
                translate([screw_top_right_x+extra_width/2,screw_top_right_y+extra_length/2,0]) cylinder(d = screw_od, h =nucleo_height);
                translate([screw_top_right_x+extra_width/2,screw_top_right_y+extra_length/2,0]) cylinder(d = screw_od*1.5, h =nucleo_height/2);
           // }
           // hull(){
                translate([screw_top_left_x+extra_width/2,screw_top_left_y+extra_length/2,0]) cylinder(d = screw_od, h =nucleo_height);
                translate([screw_top_left_x+extra_width/2,screw_top_left_y+extra_length/2,0]) cylinder(d = screw_od*1.5, h =nucleo_height/2);
           // }
        }
        translate([screw_bottom_x+extra_width/2,screw_bottom_y+extra_length/2,wall_width]) cylinder(d = screw_id, h =nucleo_height);
        translate([screw_top_right_x+extra_width/2,screw_top_right_y+extra_length/2,wall_width]) cylinder(d = screw_id, h =nucleo_height);
        translate([screw_top_left_x+extra_width/2,screw_top_left_y+extra_length/2,wall_width]) cylinder(d = screw_id, h =nucleo_height);
    }
}

module nucleo_case(){
    difference(){
       enclosure();         
        translate([wall_width,wall_width+1.5,wall_width]) opening();
    }
    translate([wall_width,wall_width+1.5,wall_width]) screw();
}

nucleo_case();
//opening();
//enclosure();
